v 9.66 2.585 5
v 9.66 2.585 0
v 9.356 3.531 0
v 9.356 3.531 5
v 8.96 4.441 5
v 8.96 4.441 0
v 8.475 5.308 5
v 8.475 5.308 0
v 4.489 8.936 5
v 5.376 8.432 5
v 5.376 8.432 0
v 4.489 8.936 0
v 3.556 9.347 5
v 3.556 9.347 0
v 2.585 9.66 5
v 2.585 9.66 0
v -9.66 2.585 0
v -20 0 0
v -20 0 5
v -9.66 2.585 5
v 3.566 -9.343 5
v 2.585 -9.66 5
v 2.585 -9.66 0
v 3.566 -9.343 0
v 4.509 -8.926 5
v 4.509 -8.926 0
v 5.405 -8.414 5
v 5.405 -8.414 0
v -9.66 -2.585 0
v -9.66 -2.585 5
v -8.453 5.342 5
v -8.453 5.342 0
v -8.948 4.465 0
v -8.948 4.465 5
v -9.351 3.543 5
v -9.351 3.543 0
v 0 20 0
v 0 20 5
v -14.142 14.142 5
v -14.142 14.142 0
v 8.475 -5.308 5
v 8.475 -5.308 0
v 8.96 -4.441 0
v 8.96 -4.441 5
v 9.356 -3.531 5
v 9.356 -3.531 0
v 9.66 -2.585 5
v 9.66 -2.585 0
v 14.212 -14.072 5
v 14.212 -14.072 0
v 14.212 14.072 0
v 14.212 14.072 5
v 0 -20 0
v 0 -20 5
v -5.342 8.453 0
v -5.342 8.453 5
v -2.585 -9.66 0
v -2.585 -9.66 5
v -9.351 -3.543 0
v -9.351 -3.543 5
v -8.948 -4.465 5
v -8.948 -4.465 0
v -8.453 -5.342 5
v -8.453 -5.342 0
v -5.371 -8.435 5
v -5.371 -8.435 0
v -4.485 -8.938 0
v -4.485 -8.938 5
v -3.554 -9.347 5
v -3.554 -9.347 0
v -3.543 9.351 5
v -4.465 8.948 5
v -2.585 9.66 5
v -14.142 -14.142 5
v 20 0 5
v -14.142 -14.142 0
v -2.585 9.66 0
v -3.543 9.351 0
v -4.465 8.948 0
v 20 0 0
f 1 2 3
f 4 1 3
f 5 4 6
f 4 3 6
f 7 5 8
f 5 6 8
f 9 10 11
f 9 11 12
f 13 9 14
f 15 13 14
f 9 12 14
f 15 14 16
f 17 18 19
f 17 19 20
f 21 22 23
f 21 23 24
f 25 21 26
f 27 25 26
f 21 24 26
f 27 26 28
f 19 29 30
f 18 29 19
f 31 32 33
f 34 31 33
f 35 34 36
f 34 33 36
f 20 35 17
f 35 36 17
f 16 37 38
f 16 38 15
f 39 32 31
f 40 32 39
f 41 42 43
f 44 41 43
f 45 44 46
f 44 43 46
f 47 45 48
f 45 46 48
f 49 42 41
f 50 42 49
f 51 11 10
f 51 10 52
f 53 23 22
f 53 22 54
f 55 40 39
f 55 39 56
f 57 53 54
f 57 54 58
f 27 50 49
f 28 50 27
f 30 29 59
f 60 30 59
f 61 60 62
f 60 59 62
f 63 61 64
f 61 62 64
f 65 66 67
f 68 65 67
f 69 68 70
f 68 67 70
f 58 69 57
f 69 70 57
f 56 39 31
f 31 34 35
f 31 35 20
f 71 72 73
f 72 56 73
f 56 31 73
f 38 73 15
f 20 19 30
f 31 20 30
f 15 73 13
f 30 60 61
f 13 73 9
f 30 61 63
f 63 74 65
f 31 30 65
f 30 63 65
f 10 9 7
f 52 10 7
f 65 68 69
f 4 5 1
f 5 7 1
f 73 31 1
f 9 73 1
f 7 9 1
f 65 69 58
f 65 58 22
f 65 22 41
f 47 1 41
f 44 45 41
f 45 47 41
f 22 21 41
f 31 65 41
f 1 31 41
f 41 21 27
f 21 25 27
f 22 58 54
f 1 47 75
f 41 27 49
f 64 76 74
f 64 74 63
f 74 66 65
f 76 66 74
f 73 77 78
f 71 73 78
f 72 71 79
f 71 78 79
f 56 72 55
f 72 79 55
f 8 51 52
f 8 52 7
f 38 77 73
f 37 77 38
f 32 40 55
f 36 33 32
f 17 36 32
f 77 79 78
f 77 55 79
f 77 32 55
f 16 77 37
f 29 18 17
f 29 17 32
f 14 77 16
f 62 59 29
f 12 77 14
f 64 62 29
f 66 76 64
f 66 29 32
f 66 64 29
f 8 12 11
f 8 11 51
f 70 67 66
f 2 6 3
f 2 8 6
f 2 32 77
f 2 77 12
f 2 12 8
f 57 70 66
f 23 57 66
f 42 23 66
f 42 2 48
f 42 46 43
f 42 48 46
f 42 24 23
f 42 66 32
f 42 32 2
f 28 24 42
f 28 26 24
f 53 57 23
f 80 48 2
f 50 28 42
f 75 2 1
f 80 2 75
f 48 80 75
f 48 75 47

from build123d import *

# Parameters (mm, degrees)
F0_R     = 10
F1_DEPTH = 5
F2_R     = 0.835
F3_DEPTH = 5.001
F3_TAPER = -3
F5_DEPTH = 5


with BuildPart() as f1:
    # F0 (on Top) → F1 (new body)
    with BuildSketch(Plane.XY):
        Circle(F0_R)
    extrude(amount=F1_DEPTH)

    # F2 (on face) → F3 (cut, through all)
    with BuildSketch(Plane.XY.offset(5)):
        Circle(F2_R)
    extrude(amount=-F3_DEPTH, taper=F3_TAPER, mode=Mode.SUBTRACT)

    # F4 (on face) → F5 (join)
    with BuildSketch(Plane(origin=(0, 0, 0), x_dir=(1, 0, 0), z_dir=(0, 0, -1))):
        Polygon((0, 20), (-3.2380346414, 7.0478614342), (-14.1421356237, 14.1421356237), (-7.0869063945, 3.2282734014), (-20, 0), (-7.0869063945, -3.2282734014), (-14.1421356237, -14.1421356237), (-3.2282734014, -7.0869063945), (0, -20), (3.2338841378, -7.0644634487), (14.21151183, -14.0724174009), (7.1094684771, -3.2226328807), (20, 0), (7.1094684771, 3.2226328807), (14.21151183, 14.0724174009), (3.2436714877, 7.0253140492), align=None)
    extrude(amount=-F5_DEPTH)


solid = f1.part
